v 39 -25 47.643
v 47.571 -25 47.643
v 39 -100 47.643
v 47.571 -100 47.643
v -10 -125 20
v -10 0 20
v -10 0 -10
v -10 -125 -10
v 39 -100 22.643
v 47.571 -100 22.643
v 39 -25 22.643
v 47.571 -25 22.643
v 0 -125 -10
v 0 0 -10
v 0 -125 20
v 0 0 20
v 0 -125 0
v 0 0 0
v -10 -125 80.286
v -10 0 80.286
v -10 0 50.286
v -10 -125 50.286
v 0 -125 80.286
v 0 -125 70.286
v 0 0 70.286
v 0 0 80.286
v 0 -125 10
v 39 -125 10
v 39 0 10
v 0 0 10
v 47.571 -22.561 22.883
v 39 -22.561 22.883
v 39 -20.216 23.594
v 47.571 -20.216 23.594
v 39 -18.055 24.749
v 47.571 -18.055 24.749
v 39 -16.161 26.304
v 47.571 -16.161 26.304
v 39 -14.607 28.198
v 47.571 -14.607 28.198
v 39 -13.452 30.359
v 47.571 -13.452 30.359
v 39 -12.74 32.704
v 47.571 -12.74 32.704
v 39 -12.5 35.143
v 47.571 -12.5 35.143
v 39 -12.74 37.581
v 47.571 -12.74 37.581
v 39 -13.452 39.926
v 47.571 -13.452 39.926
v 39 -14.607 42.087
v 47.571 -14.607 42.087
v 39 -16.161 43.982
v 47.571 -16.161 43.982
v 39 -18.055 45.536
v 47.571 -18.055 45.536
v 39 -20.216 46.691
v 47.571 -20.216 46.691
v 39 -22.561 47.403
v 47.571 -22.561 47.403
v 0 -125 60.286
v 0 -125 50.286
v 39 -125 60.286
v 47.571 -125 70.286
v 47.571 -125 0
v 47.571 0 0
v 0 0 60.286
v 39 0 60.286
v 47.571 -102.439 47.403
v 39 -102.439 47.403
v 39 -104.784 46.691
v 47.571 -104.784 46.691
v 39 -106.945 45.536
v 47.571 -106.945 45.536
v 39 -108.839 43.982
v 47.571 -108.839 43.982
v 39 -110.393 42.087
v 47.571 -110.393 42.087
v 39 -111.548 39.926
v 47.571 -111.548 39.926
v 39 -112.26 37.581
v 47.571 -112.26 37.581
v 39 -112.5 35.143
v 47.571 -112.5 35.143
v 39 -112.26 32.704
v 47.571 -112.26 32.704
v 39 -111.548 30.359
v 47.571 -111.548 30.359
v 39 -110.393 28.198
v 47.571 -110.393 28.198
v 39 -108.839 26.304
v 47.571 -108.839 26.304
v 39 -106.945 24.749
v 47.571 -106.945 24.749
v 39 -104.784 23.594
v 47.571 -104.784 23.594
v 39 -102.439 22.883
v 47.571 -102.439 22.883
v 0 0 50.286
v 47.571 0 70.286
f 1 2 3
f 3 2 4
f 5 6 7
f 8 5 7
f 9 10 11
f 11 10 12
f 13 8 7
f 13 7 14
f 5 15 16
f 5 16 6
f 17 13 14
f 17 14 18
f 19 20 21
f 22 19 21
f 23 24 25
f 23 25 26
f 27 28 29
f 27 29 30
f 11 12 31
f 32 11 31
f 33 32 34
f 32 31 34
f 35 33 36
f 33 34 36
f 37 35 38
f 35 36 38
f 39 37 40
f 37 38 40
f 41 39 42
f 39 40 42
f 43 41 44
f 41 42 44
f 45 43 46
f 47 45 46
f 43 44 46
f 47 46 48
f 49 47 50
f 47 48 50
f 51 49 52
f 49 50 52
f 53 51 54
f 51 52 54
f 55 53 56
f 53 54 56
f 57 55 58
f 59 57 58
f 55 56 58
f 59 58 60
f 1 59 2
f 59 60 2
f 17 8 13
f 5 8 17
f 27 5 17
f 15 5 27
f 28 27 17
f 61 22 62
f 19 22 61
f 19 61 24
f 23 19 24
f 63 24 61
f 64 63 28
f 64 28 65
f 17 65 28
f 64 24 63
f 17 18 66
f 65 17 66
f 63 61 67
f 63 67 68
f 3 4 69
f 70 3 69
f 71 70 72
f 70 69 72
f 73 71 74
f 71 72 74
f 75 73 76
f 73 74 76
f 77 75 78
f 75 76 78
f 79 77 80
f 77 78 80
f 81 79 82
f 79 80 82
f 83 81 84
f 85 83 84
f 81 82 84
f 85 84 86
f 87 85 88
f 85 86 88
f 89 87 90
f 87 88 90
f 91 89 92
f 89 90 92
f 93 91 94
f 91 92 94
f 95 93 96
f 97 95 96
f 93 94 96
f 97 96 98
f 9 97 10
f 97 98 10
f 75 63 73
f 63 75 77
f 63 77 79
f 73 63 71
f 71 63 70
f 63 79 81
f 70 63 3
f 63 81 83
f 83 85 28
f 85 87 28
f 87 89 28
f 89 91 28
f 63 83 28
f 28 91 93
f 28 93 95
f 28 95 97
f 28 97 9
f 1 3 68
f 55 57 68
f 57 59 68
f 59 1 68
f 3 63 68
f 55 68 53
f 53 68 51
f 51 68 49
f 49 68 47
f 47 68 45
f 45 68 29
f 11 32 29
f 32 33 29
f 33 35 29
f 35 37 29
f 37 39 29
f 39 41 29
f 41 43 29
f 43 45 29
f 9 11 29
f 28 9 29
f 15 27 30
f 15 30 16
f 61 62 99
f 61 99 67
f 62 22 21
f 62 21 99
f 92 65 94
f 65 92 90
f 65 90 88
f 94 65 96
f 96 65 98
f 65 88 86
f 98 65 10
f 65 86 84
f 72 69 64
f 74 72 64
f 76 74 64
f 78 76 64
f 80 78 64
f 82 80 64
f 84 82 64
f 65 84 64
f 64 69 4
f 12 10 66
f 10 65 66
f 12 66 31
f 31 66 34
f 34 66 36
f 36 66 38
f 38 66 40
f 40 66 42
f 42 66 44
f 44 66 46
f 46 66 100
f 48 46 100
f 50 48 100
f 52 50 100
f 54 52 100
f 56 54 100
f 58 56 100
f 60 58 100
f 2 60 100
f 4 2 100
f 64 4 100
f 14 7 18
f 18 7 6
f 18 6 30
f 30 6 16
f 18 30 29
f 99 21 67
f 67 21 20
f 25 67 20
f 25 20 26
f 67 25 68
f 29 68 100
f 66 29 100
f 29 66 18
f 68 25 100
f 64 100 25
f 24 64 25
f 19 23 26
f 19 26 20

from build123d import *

# Parameters (mm, degrees)
F1_DEPTH = 125
F3_DEPTH = 25


with BuildPart() as f1:
    # F0 (on Front) → F1 (new body)
    with BuildSketch(Plane.XZ):
        Polygon((0, -10), (0, 0), (47.57143, 0), (47.57143, 70.285714), (0, 70.285714), (0, 80.285714), (-10, 80.285714), (-10, 50.285714), (0, 50.285714), (0, 60.285714), (38.999996, 60.285714), (38.999996, 10), (0, 10), (0, 20), (-10, 20), (-10, -10), align=None)
    extrude(amount=F1_DEPTH)

    # F2 (on face) → F3 (cut)
    with BuildSketch(Plane.YZ.offset(47.57143)):
        with BuildLine():
            Line((-25, 47.642857), (-100, 47.642857))
            ThreePointArc((-100, 47.642857), (-112.5, 35.142857), (-100, 22.642857))
            Line((-100, 22.642857), (-25, 22.642857))
            ThreePointArc((-25, 22.642857), (-12.5, 35.142857), (-25, 47.642857))
        make_face()
    extrude(amount=-F3_DEPTH, mode=Mode.SUBTRACT)


solid = f1.part
